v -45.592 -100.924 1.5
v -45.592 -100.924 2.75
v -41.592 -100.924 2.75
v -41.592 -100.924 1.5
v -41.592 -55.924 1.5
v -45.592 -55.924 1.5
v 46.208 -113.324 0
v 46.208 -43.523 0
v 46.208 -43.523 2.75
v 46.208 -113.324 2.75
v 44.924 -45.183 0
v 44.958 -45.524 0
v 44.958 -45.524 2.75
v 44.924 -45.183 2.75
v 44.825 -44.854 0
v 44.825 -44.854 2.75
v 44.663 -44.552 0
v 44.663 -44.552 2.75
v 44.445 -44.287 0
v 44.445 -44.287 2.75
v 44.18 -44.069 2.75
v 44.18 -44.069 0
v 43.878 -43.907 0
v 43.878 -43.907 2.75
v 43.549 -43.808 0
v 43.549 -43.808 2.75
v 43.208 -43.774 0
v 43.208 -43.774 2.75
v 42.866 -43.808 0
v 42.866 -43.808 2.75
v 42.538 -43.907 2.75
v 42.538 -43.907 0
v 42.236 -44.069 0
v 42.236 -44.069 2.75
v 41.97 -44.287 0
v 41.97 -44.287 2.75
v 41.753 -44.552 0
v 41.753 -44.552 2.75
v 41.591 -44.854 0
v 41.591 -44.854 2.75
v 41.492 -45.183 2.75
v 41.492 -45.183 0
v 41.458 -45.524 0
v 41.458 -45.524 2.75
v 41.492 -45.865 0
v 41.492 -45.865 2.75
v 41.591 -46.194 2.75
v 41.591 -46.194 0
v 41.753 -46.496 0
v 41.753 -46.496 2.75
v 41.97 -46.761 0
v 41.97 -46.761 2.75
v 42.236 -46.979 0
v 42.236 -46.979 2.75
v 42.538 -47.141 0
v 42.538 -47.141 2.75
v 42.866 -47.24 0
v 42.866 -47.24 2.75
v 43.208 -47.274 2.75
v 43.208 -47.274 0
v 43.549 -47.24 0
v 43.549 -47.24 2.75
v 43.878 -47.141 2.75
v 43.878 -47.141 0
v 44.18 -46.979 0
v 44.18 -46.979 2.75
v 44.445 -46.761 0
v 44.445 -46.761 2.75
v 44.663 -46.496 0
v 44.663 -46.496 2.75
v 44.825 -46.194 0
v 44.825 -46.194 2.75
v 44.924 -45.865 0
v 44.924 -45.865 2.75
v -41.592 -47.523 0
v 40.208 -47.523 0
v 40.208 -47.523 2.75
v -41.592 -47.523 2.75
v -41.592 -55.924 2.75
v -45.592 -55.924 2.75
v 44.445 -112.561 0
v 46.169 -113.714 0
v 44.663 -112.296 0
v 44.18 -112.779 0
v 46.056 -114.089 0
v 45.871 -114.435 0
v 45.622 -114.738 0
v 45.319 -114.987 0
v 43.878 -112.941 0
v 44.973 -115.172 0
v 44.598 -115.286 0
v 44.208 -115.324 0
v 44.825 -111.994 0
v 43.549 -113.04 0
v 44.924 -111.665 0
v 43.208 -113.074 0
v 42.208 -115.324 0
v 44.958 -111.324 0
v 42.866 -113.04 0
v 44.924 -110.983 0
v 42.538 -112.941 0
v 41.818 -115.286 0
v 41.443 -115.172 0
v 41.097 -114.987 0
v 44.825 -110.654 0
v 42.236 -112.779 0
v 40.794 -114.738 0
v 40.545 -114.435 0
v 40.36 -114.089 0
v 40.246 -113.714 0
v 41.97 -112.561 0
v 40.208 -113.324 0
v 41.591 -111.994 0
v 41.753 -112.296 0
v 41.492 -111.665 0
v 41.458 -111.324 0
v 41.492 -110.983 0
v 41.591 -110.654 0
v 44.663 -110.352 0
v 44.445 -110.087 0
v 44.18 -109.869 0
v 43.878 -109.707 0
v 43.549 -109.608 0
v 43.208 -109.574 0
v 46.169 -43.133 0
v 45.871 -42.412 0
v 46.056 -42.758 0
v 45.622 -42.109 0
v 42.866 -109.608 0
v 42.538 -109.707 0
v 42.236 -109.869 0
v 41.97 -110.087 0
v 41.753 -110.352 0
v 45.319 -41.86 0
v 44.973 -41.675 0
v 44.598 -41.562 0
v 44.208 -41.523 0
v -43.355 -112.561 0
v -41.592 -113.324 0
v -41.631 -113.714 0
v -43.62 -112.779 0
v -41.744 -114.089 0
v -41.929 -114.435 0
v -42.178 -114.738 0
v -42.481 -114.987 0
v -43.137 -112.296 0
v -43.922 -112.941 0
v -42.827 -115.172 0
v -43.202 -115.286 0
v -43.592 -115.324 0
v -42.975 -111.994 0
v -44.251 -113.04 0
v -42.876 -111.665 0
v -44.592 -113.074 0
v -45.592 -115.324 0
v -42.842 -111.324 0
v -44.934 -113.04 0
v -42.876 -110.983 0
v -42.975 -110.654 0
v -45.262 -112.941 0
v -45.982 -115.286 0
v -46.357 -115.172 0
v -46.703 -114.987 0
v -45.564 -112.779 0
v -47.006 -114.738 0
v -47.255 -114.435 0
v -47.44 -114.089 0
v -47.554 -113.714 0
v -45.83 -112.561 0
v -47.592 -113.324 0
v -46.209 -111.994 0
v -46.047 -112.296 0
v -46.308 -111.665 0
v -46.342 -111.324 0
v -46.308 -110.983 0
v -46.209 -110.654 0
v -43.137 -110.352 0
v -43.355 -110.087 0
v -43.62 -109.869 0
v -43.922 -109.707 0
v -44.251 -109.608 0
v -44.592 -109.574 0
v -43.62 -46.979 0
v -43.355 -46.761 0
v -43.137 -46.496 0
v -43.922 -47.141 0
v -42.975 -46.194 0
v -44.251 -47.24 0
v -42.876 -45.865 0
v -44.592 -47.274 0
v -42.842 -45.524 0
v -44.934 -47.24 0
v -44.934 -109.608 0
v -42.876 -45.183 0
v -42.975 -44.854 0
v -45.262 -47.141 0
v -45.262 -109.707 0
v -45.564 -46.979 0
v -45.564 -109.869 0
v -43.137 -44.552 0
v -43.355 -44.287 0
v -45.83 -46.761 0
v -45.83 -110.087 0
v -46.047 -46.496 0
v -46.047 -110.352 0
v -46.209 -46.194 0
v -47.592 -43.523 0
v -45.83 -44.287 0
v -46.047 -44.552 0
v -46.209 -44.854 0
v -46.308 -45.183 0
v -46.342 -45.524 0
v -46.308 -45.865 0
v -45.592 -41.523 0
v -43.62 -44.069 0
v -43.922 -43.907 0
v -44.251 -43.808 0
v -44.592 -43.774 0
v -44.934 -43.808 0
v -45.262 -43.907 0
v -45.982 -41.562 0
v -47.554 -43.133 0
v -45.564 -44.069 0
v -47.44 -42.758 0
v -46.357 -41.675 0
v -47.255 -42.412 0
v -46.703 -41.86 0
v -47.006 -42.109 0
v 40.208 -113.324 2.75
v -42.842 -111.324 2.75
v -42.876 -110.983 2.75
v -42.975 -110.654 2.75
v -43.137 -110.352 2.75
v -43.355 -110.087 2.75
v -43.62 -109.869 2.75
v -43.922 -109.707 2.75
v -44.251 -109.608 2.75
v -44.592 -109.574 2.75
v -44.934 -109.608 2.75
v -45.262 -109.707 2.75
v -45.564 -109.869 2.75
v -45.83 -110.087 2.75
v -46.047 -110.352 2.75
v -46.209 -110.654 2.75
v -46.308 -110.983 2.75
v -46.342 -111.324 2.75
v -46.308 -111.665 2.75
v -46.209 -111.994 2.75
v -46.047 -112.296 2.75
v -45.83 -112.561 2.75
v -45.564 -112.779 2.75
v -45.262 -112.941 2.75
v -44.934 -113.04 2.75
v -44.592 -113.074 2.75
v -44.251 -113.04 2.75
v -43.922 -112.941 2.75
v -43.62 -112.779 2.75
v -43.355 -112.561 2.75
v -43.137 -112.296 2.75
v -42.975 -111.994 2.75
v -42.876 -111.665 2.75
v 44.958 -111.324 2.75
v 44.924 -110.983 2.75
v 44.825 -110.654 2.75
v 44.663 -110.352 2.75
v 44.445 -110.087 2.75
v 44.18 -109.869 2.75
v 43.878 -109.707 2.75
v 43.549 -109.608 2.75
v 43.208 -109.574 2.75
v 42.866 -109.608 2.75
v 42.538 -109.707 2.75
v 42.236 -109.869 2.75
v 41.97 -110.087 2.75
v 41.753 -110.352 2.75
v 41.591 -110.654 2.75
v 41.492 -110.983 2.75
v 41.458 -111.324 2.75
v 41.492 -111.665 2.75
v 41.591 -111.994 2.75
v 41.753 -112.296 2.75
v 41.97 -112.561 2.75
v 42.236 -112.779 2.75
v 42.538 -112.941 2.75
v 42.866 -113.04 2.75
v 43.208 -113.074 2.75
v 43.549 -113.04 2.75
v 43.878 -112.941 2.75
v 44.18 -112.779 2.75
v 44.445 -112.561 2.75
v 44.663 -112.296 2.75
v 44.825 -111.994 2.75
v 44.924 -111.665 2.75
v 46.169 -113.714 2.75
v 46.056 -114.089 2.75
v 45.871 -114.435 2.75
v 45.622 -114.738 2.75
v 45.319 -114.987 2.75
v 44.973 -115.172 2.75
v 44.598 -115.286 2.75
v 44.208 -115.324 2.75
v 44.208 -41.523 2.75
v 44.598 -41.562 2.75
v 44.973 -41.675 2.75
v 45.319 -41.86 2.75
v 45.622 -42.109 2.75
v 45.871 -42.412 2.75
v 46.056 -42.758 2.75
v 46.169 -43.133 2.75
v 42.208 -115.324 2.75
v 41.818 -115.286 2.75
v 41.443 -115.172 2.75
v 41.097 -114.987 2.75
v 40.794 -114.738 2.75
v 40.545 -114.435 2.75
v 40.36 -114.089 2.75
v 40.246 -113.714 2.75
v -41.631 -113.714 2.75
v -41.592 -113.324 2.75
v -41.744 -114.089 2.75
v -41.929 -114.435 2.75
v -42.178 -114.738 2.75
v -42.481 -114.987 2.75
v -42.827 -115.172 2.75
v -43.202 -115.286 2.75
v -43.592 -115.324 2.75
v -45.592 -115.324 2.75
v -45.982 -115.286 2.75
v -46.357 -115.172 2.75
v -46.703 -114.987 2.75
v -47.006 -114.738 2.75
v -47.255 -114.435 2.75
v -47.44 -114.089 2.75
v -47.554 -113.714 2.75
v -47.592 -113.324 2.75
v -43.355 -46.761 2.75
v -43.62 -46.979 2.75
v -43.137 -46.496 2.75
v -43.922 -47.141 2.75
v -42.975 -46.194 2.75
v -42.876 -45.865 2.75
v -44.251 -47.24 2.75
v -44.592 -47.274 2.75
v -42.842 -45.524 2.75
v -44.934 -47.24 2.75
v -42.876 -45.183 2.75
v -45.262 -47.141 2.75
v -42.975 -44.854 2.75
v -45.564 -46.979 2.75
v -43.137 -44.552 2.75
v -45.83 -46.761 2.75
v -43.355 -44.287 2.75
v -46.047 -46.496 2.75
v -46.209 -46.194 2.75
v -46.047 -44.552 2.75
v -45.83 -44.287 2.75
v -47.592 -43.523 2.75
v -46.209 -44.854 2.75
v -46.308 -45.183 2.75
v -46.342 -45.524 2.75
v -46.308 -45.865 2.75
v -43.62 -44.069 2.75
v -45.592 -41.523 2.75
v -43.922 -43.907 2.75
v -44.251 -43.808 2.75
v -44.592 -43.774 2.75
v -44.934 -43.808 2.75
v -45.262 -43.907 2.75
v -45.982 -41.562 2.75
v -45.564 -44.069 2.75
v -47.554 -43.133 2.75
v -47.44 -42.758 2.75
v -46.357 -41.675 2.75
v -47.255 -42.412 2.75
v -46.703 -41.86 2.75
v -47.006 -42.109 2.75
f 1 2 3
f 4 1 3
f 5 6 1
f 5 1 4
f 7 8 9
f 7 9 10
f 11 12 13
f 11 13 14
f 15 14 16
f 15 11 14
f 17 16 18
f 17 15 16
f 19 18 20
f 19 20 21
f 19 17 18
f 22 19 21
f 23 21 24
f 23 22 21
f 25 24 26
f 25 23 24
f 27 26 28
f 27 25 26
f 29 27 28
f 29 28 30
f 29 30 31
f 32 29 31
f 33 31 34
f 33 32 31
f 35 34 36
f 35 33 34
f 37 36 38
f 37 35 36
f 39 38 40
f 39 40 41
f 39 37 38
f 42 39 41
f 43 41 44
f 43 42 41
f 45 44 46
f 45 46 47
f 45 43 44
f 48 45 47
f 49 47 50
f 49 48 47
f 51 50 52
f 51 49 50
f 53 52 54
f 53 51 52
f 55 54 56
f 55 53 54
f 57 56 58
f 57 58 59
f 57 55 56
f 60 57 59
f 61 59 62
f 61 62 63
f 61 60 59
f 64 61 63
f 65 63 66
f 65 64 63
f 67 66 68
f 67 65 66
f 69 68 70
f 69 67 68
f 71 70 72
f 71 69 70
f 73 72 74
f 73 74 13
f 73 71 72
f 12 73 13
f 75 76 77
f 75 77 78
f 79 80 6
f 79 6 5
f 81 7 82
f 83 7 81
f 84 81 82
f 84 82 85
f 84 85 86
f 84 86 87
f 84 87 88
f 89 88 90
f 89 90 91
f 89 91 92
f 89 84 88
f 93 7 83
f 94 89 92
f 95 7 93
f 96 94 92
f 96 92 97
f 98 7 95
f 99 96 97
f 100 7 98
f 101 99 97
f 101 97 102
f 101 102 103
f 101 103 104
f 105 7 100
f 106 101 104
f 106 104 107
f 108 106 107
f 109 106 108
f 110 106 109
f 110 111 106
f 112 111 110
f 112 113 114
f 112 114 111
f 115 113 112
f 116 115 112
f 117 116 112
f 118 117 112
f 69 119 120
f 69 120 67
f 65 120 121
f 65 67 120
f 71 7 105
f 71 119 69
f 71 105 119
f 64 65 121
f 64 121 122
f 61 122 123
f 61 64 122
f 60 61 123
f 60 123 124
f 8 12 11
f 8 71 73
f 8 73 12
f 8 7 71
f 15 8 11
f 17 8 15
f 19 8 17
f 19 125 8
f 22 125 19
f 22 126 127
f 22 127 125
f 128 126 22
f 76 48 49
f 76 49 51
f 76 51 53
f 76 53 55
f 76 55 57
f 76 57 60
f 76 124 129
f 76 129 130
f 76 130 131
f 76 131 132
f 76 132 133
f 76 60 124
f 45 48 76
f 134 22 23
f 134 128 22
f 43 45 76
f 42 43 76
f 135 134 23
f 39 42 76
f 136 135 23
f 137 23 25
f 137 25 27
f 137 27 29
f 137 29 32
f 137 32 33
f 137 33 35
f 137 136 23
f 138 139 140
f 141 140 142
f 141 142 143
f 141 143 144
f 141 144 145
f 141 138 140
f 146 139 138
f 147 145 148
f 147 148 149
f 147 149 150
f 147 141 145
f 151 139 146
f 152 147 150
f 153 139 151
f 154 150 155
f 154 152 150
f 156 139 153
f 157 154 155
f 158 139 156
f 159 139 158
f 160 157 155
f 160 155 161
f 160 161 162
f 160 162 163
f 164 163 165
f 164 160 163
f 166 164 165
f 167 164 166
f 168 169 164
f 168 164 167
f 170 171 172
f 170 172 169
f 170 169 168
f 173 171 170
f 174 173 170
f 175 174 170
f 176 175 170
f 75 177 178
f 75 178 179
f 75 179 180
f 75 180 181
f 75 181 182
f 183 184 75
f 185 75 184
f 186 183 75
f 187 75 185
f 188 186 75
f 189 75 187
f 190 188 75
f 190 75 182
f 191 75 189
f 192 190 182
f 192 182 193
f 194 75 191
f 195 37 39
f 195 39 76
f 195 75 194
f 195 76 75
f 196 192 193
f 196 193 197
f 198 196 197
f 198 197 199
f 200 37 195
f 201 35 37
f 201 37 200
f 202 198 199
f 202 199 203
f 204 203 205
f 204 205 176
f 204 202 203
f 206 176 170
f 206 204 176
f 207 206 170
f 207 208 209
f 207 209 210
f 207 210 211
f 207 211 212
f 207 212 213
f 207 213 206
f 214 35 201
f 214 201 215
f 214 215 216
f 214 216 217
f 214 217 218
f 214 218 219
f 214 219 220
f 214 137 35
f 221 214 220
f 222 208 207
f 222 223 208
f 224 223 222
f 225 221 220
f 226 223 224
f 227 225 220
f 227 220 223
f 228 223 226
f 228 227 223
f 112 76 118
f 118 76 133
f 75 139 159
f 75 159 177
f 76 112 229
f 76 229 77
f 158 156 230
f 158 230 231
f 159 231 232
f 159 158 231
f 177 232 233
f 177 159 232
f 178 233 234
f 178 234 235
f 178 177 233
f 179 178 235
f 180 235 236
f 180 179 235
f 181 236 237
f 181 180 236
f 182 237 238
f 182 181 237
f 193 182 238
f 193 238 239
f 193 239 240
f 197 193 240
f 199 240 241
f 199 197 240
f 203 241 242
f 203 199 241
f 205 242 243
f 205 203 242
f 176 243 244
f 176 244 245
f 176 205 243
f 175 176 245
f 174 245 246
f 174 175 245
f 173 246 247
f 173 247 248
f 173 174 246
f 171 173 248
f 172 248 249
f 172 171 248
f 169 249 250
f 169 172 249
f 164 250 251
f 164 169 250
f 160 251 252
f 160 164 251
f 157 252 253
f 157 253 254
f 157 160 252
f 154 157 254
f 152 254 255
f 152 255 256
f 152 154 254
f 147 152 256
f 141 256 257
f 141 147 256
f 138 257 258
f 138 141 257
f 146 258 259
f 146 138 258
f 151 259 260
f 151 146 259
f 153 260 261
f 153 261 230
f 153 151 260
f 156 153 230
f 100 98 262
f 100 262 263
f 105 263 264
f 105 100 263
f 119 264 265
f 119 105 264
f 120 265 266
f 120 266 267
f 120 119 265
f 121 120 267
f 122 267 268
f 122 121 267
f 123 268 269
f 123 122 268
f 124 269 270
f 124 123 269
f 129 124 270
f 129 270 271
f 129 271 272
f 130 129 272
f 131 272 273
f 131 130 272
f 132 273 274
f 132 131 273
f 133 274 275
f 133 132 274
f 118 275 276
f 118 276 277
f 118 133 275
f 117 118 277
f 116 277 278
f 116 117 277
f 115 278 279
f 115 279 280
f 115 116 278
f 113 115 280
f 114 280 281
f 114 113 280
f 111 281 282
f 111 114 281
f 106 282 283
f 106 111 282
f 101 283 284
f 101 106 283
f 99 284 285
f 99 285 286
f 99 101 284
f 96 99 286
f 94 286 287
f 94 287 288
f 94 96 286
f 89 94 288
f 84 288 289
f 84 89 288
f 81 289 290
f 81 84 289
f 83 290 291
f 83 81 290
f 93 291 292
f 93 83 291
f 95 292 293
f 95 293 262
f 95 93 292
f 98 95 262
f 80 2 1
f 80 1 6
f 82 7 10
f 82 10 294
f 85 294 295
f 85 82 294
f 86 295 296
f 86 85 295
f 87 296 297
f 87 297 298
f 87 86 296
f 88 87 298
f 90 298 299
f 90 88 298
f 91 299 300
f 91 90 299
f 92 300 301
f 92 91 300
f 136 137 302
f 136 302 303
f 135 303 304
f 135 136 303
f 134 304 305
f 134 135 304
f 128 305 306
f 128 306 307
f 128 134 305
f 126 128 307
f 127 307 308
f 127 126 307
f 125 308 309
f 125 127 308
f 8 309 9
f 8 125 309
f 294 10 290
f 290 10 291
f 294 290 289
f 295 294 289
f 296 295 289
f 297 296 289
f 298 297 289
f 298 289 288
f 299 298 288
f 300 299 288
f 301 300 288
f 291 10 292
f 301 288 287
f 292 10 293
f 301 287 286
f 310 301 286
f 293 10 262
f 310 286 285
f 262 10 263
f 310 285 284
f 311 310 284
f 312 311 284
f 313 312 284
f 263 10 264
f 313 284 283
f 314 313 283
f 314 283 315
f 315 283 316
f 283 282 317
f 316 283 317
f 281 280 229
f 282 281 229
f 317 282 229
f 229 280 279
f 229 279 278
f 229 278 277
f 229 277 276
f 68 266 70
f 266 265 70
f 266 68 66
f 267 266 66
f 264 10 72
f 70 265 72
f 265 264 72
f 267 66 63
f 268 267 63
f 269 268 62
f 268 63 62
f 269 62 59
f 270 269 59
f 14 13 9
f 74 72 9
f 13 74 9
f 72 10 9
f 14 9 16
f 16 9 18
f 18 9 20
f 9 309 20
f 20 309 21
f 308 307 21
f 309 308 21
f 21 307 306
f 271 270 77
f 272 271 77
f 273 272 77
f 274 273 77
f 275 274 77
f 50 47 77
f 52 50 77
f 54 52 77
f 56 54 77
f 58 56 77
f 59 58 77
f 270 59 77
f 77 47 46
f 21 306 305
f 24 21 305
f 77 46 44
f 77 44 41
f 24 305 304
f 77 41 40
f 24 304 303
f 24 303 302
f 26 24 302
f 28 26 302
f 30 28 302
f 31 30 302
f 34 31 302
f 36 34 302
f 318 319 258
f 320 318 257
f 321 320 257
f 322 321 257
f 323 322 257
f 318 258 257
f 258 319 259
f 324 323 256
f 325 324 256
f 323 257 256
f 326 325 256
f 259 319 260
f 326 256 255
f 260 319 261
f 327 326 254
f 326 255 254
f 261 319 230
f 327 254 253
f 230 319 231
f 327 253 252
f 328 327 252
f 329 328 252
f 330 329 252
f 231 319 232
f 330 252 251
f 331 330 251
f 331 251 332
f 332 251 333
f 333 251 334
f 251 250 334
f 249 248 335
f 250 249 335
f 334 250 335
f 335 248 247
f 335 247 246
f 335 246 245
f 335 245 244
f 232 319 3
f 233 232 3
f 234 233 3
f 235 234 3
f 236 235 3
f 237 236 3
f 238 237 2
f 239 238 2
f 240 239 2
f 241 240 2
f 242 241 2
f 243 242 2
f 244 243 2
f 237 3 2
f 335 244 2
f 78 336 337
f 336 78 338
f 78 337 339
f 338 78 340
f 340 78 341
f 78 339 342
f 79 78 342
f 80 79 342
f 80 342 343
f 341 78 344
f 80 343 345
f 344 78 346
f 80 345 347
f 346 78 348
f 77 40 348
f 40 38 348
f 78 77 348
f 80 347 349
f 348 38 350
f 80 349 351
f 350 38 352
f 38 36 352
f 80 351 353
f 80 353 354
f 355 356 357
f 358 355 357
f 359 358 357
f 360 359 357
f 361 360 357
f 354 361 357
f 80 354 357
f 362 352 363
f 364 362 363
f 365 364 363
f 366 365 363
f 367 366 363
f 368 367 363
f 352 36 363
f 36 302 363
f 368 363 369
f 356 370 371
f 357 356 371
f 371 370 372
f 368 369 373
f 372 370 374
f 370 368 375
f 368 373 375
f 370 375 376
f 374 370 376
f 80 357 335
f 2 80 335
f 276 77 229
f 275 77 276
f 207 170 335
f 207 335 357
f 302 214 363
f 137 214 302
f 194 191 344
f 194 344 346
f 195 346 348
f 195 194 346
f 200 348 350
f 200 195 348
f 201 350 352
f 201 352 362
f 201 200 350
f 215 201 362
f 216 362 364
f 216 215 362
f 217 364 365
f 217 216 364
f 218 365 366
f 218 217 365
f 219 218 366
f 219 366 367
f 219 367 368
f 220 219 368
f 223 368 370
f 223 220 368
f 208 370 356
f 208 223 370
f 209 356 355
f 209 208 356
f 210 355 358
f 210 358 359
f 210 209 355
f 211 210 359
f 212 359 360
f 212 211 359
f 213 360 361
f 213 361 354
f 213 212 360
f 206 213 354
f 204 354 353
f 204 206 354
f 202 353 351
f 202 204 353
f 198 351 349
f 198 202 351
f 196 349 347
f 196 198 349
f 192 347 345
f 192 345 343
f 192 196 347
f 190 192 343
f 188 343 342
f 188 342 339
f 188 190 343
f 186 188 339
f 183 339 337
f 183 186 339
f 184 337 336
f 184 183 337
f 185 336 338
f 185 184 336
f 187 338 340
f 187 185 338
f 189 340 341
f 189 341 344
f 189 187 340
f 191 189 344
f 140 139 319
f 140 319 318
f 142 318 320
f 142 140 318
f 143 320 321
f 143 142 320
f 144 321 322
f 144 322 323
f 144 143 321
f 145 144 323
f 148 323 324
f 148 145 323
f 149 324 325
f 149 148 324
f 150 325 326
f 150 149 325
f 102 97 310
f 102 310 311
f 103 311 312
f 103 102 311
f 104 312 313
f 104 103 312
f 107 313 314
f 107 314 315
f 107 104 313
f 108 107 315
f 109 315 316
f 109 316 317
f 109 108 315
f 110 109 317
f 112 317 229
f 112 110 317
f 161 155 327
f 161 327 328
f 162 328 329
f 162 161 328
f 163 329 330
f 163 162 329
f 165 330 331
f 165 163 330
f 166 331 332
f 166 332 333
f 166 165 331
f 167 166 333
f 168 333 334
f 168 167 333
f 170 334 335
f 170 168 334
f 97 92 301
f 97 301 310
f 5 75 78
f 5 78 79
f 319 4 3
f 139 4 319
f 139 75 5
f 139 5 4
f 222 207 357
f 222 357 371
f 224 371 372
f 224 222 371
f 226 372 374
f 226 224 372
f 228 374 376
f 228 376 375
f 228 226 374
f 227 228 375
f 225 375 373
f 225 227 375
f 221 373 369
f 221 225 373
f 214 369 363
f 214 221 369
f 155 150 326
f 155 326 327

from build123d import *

# Parameters (mm, degrees)
SKETCH1_R           = 1.75
BOSS_EXTRUDE1_DEPTH = 2.75
SKETCH2_W           = 4
SKETCH2_H           = 45
CUT_EXTRUDE1_DEPTH  = 1.25


with BuildPart() as part:
    # Sketch1 → Boss-Extrude1 (new body)
    with BuildSketch(Plane.XY):
        with BuildLine():
            Line((-41.592117096, -107.975551573), (-41.592117096, -113.323938617))
            ThreePointArc((-41.592117096, -113.323938617), (-42.177903534, -114.73815218), (-43.592117096, -115.323938617))
            Line((-43.592117096, -115.323938617), (-45.592117096, -115.323938617))
            ThreePointArc((-45.592117096, -115.323938617), (-47.006330659, -114.73815218), (-47.592117096, -113.323938617))
            Line((-47.592117096, -113.323938617), (-47.592117096, -43.523080591))
            ThreePointArc((-47.592117096, -43.523080591), (-47.006330659, -42.108867028), (-45.592117096, -41.523080591))
            Line((-45.592117096, -41.523080591), (44.207882904, -41.523080591))
            ThreePointArc((44.207882904, -41.523080591), (45.622096466, -42.108867028), (46.207882904, -43.523080591))
            Line((46.207882904, -43.523080591), (46.207882904, -113.323938617))
            ThreePointArc((46.207882904, -113.323938617), (45.622096466, -114.73815218), (44.207882904, -115.323938617))
            Line((44.207882904, -115.323938617), (42.207882904, -115.323938617))
            ThreePointArc((42.207882904, -115.323938617), (40.793669341, -114.73815218), (40.207882904, -113.323938617))
            Line((40.207882904, -113.323938617), (40.207882904, -107.975551573))
            Line((40.207882904, -107.975551573), (40.207882904, -47.523080591))
            Line((40.207882904, -47.523080591), (-41.592117096, -47.523080591))
            Line((-41.592117096, -47.523080591), (-41.592117096, -107.975551573))
        make_face()
        with Locations((-44.592117096, -45.523938617)):
            Circle(SKETCH1_R, mode=Mode.SUBTRACT)
        with Locations((43.207882904, -45.523938617)):
            Circle(SKETCH1_R, mode=Mode.SUBTRACT)
        with Locations((43.207882904, -111.323938617)):
            Circle(SKETCH1_R, mode=Mode.SUBTRACT)
        with Locations((-44.592117096, -111.323938617)):
            Circle(SKETCH1_R, mode=Mode.SUBTRACT)
    extrude(amount=BOSS_EXTRUDE1_DEPTH)

    # Sketch2 → Cut-Extrude1 (cut)
    with BuildSketch(Plane.XY.offset(2.75)):
        with Locations((-43.592117096, -78.423509604)):
            Rectangle(SKETCH2_W, SKETCH2_H)
    extrude(amount=-CUT_EXTRUDE1_DEPTH, mode=Mode.SUBTRACT)


solid = part.part
